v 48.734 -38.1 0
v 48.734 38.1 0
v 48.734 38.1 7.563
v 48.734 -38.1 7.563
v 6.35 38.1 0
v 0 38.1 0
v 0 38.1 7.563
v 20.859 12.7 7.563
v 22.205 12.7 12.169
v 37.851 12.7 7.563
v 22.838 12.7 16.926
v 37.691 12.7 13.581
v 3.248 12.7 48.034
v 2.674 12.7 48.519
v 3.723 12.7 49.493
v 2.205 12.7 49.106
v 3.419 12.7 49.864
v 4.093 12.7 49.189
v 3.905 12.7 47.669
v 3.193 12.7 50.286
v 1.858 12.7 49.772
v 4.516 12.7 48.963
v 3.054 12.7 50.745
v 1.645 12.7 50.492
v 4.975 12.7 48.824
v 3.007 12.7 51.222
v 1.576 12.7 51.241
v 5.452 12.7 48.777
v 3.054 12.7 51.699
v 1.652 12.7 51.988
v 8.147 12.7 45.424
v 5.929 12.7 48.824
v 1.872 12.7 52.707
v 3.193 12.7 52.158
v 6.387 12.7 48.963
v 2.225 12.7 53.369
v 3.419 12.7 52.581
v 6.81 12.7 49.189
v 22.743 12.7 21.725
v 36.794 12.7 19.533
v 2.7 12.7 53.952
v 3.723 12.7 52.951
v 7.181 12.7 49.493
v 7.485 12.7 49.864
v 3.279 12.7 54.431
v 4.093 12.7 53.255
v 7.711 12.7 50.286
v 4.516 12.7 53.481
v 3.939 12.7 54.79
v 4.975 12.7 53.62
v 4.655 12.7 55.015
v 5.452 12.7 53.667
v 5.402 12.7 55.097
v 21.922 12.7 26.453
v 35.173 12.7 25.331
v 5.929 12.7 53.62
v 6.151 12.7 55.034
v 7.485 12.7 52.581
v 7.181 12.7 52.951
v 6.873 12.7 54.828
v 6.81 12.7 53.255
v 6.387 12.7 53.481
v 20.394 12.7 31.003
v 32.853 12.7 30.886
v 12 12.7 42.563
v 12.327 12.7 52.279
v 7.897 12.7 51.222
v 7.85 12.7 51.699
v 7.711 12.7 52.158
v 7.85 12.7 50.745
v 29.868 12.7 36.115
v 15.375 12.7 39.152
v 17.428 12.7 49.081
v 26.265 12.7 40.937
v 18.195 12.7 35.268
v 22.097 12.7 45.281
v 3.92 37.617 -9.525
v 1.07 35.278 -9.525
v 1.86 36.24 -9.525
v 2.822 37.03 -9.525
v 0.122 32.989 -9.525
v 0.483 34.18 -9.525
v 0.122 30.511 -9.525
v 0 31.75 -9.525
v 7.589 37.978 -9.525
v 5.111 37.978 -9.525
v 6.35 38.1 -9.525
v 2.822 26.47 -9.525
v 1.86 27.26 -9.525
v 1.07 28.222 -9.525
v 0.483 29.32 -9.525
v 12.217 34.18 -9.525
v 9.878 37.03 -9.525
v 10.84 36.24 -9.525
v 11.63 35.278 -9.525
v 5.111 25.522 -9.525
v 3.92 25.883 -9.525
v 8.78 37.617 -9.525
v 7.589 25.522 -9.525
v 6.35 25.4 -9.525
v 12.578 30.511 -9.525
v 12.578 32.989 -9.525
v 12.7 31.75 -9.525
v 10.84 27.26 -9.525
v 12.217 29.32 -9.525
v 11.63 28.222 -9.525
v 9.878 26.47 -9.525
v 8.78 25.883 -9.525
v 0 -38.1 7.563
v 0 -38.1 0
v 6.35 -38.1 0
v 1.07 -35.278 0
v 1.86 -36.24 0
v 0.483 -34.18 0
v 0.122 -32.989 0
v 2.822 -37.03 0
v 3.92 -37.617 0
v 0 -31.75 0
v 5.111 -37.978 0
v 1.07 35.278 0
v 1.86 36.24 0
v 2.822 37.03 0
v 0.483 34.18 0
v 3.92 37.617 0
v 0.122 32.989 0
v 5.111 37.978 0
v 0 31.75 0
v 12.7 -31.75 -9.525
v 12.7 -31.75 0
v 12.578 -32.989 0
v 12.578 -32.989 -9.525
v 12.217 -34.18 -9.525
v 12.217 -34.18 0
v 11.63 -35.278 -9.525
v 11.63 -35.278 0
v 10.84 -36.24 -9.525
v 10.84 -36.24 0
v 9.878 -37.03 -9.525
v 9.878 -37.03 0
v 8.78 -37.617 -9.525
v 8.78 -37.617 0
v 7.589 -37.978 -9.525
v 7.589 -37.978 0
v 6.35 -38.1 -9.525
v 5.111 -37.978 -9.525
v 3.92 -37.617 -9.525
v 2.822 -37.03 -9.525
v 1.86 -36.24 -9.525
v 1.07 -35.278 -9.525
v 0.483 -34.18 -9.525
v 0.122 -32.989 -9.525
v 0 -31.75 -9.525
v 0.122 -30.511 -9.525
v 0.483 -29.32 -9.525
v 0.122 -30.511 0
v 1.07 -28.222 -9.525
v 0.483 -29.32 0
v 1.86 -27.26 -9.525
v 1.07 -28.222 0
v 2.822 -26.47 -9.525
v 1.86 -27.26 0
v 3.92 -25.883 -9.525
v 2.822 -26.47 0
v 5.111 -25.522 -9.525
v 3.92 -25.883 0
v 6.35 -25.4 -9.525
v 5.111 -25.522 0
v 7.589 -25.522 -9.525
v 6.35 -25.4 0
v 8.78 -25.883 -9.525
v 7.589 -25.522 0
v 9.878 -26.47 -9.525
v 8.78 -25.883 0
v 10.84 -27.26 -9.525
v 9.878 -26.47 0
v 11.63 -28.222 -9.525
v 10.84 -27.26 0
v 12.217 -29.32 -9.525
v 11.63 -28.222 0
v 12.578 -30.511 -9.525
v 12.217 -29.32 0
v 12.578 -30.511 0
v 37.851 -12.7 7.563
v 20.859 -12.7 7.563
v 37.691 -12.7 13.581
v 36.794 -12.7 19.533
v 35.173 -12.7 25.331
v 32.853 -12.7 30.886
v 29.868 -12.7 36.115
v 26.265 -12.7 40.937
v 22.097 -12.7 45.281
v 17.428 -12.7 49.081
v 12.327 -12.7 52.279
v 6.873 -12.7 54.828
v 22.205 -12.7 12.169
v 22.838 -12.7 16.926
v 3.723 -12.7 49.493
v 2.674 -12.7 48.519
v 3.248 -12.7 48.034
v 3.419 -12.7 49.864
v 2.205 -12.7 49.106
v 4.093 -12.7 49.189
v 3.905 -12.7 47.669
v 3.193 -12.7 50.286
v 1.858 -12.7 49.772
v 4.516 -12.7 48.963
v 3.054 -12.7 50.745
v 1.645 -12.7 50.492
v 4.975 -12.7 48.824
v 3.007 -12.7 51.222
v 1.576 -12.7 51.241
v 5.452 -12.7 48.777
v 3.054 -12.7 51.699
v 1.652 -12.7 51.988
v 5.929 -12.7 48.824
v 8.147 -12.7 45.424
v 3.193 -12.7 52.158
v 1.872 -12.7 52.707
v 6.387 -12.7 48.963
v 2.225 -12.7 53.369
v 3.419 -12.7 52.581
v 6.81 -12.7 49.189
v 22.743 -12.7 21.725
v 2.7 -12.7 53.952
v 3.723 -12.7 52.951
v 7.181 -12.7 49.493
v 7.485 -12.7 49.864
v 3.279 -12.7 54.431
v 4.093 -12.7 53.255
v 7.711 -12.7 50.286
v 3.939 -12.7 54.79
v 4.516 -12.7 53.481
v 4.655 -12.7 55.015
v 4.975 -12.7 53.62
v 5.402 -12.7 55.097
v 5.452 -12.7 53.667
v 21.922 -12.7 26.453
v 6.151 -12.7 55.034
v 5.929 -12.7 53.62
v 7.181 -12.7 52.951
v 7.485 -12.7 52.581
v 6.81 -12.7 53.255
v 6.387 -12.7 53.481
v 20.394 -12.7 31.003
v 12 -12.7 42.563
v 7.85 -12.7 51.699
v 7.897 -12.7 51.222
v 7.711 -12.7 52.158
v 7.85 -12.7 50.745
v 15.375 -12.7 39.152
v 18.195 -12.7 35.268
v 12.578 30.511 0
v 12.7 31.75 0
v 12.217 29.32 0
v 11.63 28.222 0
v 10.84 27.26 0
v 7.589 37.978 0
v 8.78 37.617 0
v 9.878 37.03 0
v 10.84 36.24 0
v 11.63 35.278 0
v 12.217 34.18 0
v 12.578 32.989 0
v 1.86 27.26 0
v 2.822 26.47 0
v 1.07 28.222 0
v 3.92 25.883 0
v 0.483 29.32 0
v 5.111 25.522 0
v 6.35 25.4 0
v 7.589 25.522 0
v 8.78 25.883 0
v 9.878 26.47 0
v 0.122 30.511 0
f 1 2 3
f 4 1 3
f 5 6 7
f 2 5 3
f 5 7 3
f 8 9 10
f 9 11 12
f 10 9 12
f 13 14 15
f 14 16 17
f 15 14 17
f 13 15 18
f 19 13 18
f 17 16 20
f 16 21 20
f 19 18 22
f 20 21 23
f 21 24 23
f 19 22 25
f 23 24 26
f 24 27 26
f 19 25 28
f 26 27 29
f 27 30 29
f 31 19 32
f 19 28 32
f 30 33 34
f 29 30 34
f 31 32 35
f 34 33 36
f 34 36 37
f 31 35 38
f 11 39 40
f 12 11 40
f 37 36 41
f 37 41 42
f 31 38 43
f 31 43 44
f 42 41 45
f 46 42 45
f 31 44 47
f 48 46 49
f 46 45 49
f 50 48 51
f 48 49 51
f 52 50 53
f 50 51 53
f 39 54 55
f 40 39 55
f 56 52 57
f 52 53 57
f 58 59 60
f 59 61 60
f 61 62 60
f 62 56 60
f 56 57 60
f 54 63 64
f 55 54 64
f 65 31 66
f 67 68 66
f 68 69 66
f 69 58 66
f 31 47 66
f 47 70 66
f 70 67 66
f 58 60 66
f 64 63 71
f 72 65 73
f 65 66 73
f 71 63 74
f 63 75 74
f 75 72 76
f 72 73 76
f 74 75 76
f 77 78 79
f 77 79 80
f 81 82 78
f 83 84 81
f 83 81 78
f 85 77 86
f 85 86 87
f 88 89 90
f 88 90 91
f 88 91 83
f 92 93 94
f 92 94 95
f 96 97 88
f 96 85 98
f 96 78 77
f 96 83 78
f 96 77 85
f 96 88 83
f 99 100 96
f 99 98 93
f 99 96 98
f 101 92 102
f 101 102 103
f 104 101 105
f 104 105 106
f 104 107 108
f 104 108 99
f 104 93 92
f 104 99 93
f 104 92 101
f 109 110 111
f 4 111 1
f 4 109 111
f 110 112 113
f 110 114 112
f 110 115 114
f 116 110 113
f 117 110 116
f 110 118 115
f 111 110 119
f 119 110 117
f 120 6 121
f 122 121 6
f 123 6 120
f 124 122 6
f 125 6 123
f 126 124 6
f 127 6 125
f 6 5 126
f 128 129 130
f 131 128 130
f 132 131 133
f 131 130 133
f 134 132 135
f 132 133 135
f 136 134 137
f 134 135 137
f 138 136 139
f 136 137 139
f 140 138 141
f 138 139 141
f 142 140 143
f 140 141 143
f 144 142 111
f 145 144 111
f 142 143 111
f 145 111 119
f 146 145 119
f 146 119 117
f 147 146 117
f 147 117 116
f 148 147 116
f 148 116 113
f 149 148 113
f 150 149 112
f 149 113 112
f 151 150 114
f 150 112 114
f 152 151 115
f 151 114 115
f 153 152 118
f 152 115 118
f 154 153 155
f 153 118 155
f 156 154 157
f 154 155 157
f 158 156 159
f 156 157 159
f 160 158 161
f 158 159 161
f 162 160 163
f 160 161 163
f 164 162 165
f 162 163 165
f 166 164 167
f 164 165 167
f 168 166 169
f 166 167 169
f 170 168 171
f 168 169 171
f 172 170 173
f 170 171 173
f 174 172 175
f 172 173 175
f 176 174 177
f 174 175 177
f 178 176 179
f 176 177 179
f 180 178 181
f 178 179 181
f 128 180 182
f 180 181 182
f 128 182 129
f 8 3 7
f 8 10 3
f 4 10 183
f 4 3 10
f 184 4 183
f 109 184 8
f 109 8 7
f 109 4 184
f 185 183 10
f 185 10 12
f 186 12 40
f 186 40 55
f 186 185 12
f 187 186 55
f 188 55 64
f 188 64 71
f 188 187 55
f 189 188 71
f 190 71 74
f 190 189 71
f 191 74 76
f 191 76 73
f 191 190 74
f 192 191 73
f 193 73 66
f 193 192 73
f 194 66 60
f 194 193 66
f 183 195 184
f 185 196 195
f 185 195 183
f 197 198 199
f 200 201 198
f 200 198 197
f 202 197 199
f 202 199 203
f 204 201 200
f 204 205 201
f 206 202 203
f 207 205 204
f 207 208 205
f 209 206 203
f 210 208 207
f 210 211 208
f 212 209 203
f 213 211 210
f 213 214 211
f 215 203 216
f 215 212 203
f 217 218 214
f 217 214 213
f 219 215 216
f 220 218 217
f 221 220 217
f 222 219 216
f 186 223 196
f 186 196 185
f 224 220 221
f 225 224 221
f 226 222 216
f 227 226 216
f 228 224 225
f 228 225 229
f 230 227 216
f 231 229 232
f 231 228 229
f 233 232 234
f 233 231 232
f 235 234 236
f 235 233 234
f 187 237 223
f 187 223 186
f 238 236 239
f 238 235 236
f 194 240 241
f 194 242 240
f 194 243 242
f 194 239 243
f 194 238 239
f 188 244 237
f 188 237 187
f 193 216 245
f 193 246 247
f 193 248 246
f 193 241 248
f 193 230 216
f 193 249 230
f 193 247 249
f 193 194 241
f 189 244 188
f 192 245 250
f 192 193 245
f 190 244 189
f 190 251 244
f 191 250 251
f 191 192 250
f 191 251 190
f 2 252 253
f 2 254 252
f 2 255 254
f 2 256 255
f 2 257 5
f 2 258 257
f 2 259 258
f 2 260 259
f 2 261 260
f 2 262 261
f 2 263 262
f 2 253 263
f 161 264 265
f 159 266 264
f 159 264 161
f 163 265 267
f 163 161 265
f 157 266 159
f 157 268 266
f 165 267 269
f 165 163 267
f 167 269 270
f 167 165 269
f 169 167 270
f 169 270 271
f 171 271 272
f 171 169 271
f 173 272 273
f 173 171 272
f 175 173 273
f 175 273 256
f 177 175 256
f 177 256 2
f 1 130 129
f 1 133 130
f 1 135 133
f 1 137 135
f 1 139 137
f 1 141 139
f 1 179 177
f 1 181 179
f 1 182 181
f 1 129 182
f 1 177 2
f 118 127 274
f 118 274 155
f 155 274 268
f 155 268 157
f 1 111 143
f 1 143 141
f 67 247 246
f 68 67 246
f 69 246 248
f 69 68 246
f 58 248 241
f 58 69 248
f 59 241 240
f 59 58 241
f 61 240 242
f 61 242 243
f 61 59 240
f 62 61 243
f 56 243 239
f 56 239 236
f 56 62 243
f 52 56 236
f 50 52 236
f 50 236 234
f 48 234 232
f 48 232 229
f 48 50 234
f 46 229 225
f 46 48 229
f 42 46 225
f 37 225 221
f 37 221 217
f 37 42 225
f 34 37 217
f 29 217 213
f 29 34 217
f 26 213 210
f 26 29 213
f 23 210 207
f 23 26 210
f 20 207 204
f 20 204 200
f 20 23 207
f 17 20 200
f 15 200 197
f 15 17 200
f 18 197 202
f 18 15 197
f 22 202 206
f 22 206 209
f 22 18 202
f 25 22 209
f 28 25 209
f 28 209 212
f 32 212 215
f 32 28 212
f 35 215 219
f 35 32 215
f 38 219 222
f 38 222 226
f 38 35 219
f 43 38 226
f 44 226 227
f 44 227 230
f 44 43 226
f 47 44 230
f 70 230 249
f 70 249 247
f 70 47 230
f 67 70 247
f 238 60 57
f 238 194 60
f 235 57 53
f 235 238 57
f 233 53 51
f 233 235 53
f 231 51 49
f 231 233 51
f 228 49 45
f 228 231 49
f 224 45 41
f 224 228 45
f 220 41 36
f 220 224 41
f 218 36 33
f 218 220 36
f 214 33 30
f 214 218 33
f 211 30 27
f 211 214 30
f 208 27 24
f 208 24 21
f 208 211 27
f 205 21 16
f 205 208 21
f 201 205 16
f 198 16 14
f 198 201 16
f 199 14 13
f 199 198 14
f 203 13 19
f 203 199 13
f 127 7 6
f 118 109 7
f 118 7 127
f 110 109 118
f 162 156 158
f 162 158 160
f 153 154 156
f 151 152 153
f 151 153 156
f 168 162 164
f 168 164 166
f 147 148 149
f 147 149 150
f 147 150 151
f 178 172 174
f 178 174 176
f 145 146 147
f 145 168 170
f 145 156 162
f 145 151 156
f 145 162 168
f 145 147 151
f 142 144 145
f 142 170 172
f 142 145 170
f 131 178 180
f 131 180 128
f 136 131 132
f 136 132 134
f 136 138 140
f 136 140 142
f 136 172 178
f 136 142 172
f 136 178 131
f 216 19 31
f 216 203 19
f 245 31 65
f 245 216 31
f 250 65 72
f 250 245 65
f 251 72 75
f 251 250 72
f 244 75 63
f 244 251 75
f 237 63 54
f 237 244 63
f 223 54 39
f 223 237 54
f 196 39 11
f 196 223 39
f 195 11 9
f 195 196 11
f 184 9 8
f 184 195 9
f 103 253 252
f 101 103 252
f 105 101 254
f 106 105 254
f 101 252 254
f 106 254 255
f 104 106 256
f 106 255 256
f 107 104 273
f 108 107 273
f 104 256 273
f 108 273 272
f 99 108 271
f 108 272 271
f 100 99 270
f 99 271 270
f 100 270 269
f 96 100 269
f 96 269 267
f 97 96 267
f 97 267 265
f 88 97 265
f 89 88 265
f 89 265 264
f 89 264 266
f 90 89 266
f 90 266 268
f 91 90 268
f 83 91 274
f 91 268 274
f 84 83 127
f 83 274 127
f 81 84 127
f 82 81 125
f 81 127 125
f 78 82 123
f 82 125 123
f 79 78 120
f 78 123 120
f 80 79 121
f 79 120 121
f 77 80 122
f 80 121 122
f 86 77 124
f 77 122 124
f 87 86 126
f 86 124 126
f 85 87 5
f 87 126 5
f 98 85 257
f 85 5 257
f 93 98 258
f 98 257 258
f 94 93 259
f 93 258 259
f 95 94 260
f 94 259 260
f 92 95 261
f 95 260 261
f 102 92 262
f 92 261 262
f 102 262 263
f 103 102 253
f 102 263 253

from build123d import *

# Parameters (mm, degrees)
F1_DEPTH = 38.1
F0_R     = 2.445033
F2_DEPTH = 12.7
F3_R     = 6.35
F4_DEPTH = 9.525


with BuildPart() as f1:
    # F0 (on Front) → F1 (new body, symmetric)
    with BuildSketch(Plane.XZ):
        Polygon((0, 7.562613), (0, 0), (48.733659, 0), (48.733659, 7.562613), (37.851159, 7.562613), (20.859193, 7.562613), align=None)
    extrude(amount=F1_DEPTH, both=True)

    # F0 (on Front) → F2 (join, symmetric)
    with BuildSketch(Plane.XZ):
        with BuildLine():
            ThreePointArc((3.904653, 47.668676), (20.394154, 31.002756), (20.859193, 7.562613))
            Line((20.859193, 7.562613), (37.851159, 7.562613))
            ThreePointArc((37.851159, 7.562613), (29.868225, 36.114692), (6.873098, 54.82759))
            ThreePointArc((6.873098, 54.82759), (1.871612, 52.706566), (3.904653, 47.668676))
        make_face()
        with Locations((5.451619, 51.222116)):
            Circle(F0_R, mode=Mode.SUBTRACT)
    extrude(amount=F2_DEPTH, both=True)

    # F3 (on face) → F4 (join)
    with BuildSketch(Plane(origin=(0, 0, 0), x_dir=(1, 0, 0), z_dir=(0, 0, -1))):
        with Locations((6.35, -31.75)):
            Circle(F3_R)
        with Locations((6.35, 31.75)):
            Circle(F3_R)
    extrude(amount=F4_DEPTH)


solid = f1.part
